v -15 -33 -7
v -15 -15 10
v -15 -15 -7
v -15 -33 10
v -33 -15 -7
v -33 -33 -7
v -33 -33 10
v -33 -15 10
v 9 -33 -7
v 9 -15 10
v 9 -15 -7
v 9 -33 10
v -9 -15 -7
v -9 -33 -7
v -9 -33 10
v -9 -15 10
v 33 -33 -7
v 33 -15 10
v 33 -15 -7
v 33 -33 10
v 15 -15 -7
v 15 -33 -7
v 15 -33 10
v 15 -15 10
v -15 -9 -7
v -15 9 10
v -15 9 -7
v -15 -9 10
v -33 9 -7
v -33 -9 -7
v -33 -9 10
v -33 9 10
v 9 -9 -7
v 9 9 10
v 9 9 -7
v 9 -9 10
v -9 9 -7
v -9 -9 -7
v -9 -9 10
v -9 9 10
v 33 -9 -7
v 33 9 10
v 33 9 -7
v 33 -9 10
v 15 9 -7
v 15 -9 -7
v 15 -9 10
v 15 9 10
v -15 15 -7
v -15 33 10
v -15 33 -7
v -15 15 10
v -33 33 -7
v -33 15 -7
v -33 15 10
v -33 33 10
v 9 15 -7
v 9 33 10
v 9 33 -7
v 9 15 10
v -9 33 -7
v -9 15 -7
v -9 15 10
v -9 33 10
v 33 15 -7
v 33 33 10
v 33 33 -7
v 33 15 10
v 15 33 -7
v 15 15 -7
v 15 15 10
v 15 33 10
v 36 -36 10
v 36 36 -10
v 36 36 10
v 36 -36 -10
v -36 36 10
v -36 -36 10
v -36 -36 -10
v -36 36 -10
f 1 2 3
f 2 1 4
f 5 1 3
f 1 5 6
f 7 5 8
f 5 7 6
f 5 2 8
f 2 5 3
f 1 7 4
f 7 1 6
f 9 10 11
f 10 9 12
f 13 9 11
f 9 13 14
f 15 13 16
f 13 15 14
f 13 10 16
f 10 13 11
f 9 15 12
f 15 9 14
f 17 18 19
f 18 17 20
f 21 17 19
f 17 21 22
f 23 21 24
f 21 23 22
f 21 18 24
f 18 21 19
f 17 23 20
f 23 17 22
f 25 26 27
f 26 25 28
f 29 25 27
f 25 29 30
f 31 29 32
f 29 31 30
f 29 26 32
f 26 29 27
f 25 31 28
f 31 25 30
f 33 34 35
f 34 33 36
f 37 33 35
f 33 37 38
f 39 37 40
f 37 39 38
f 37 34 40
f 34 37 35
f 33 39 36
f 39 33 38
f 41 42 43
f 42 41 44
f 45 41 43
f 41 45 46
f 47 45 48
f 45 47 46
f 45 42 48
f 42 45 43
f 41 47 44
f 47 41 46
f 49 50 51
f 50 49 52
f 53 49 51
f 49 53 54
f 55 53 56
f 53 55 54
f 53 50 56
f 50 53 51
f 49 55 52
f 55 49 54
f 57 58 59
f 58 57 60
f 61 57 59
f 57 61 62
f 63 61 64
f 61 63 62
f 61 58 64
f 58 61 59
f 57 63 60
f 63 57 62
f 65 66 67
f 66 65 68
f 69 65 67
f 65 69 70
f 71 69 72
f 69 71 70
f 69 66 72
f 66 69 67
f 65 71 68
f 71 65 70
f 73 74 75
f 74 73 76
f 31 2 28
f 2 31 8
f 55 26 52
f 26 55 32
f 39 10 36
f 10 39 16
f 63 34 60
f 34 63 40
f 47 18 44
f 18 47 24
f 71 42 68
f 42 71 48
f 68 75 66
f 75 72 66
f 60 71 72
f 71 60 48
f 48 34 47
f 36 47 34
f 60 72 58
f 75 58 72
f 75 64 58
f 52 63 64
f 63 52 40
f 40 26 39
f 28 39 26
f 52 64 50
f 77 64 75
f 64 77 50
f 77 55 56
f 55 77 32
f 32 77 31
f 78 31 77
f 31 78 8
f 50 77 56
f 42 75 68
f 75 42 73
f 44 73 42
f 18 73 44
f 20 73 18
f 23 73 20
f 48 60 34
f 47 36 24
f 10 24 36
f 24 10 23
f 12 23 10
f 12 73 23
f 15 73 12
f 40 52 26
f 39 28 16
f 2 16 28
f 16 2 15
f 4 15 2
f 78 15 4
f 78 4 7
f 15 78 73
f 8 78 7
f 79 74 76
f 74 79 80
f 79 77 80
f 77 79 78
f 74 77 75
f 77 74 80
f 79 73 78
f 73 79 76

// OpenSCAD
$fn = 32;

// ----------------------------------------------------------------------
// Pocket plate 72 x 72 x 20
// 3 x 3 pockets 18 mm square, 17 mm deep
// ----------------------------------------------------------------------

// --- parameters (mm) ---
thickness = 20;  // plate thickness
floor_t = 3;     // material left under each pocket
pocket = 18;     // pocket side length
pitch_x = 24;    // pocket pitch along X
pitch_y = 24;    // pocket pitch along Y
cols = 3;        // pockets per row
rows = 3;        // rows of pockets

// --- derived feature positions (mm) ---
depth = thickness - floor_t;        // = 17   pocket depth, down to the floor
span_x = (cols - 1) * pitch_x;      // = 48   distance between outer pockets
span_y = (rows - 1) * pitch_y;      // = 48   distance between outer pocket rows
origin_x = -span_x / 2;             // = -24   X of the first pocket
origin_y = -span_y / 2;             // = -24   Y of the first pocket
plate = [span_x + pocket + 6, span_y + pocket + 6, thickness];  // = [72, 72, 20]   overall size: pockets plus 3 mm of wall on each side
feature_centers = [
  [origin_x + 0 * pitch_x, origin_y + 0 * pitch_y],
  [origin_x + 1 * pitch_x, origin_y + 0 * pitch_y],
  [origin_x + 2 * pitch_x, origin_y + 0 * pitch_y],
  [origin_x + 0 * pitch_x, origin_y + 1 * pitch_y],
  [origin_x + 1 * pitch_x, origin_y + 1 * pitch_y],
  [origin_x + 2 * pitch_x, origin_y + 1 * pitch_y],
  [origin_x + 0 * pitch_x, origin_y + 2 * pitch_y],
  [origin_x + 1 * pitch_x, origin_y + 2 * pitch_y],
  [origin_x + 2 * pitch_x, origin_y + 2 * pitch_y]
];   // pocket centres, used verbatim by the cutter loop

// plate outline, then one pocket per centre in feature_centers
difference() {
  cube(plate, center = true);
  for (centre = feature_centers)
    translate([centre[0] - pocket / 2, centre[1] - pocket / 2, plate[2] / 2 - depth])
      cube([pocket, pocket, depth + 1]);  // centred on the declared pocket centre
}
